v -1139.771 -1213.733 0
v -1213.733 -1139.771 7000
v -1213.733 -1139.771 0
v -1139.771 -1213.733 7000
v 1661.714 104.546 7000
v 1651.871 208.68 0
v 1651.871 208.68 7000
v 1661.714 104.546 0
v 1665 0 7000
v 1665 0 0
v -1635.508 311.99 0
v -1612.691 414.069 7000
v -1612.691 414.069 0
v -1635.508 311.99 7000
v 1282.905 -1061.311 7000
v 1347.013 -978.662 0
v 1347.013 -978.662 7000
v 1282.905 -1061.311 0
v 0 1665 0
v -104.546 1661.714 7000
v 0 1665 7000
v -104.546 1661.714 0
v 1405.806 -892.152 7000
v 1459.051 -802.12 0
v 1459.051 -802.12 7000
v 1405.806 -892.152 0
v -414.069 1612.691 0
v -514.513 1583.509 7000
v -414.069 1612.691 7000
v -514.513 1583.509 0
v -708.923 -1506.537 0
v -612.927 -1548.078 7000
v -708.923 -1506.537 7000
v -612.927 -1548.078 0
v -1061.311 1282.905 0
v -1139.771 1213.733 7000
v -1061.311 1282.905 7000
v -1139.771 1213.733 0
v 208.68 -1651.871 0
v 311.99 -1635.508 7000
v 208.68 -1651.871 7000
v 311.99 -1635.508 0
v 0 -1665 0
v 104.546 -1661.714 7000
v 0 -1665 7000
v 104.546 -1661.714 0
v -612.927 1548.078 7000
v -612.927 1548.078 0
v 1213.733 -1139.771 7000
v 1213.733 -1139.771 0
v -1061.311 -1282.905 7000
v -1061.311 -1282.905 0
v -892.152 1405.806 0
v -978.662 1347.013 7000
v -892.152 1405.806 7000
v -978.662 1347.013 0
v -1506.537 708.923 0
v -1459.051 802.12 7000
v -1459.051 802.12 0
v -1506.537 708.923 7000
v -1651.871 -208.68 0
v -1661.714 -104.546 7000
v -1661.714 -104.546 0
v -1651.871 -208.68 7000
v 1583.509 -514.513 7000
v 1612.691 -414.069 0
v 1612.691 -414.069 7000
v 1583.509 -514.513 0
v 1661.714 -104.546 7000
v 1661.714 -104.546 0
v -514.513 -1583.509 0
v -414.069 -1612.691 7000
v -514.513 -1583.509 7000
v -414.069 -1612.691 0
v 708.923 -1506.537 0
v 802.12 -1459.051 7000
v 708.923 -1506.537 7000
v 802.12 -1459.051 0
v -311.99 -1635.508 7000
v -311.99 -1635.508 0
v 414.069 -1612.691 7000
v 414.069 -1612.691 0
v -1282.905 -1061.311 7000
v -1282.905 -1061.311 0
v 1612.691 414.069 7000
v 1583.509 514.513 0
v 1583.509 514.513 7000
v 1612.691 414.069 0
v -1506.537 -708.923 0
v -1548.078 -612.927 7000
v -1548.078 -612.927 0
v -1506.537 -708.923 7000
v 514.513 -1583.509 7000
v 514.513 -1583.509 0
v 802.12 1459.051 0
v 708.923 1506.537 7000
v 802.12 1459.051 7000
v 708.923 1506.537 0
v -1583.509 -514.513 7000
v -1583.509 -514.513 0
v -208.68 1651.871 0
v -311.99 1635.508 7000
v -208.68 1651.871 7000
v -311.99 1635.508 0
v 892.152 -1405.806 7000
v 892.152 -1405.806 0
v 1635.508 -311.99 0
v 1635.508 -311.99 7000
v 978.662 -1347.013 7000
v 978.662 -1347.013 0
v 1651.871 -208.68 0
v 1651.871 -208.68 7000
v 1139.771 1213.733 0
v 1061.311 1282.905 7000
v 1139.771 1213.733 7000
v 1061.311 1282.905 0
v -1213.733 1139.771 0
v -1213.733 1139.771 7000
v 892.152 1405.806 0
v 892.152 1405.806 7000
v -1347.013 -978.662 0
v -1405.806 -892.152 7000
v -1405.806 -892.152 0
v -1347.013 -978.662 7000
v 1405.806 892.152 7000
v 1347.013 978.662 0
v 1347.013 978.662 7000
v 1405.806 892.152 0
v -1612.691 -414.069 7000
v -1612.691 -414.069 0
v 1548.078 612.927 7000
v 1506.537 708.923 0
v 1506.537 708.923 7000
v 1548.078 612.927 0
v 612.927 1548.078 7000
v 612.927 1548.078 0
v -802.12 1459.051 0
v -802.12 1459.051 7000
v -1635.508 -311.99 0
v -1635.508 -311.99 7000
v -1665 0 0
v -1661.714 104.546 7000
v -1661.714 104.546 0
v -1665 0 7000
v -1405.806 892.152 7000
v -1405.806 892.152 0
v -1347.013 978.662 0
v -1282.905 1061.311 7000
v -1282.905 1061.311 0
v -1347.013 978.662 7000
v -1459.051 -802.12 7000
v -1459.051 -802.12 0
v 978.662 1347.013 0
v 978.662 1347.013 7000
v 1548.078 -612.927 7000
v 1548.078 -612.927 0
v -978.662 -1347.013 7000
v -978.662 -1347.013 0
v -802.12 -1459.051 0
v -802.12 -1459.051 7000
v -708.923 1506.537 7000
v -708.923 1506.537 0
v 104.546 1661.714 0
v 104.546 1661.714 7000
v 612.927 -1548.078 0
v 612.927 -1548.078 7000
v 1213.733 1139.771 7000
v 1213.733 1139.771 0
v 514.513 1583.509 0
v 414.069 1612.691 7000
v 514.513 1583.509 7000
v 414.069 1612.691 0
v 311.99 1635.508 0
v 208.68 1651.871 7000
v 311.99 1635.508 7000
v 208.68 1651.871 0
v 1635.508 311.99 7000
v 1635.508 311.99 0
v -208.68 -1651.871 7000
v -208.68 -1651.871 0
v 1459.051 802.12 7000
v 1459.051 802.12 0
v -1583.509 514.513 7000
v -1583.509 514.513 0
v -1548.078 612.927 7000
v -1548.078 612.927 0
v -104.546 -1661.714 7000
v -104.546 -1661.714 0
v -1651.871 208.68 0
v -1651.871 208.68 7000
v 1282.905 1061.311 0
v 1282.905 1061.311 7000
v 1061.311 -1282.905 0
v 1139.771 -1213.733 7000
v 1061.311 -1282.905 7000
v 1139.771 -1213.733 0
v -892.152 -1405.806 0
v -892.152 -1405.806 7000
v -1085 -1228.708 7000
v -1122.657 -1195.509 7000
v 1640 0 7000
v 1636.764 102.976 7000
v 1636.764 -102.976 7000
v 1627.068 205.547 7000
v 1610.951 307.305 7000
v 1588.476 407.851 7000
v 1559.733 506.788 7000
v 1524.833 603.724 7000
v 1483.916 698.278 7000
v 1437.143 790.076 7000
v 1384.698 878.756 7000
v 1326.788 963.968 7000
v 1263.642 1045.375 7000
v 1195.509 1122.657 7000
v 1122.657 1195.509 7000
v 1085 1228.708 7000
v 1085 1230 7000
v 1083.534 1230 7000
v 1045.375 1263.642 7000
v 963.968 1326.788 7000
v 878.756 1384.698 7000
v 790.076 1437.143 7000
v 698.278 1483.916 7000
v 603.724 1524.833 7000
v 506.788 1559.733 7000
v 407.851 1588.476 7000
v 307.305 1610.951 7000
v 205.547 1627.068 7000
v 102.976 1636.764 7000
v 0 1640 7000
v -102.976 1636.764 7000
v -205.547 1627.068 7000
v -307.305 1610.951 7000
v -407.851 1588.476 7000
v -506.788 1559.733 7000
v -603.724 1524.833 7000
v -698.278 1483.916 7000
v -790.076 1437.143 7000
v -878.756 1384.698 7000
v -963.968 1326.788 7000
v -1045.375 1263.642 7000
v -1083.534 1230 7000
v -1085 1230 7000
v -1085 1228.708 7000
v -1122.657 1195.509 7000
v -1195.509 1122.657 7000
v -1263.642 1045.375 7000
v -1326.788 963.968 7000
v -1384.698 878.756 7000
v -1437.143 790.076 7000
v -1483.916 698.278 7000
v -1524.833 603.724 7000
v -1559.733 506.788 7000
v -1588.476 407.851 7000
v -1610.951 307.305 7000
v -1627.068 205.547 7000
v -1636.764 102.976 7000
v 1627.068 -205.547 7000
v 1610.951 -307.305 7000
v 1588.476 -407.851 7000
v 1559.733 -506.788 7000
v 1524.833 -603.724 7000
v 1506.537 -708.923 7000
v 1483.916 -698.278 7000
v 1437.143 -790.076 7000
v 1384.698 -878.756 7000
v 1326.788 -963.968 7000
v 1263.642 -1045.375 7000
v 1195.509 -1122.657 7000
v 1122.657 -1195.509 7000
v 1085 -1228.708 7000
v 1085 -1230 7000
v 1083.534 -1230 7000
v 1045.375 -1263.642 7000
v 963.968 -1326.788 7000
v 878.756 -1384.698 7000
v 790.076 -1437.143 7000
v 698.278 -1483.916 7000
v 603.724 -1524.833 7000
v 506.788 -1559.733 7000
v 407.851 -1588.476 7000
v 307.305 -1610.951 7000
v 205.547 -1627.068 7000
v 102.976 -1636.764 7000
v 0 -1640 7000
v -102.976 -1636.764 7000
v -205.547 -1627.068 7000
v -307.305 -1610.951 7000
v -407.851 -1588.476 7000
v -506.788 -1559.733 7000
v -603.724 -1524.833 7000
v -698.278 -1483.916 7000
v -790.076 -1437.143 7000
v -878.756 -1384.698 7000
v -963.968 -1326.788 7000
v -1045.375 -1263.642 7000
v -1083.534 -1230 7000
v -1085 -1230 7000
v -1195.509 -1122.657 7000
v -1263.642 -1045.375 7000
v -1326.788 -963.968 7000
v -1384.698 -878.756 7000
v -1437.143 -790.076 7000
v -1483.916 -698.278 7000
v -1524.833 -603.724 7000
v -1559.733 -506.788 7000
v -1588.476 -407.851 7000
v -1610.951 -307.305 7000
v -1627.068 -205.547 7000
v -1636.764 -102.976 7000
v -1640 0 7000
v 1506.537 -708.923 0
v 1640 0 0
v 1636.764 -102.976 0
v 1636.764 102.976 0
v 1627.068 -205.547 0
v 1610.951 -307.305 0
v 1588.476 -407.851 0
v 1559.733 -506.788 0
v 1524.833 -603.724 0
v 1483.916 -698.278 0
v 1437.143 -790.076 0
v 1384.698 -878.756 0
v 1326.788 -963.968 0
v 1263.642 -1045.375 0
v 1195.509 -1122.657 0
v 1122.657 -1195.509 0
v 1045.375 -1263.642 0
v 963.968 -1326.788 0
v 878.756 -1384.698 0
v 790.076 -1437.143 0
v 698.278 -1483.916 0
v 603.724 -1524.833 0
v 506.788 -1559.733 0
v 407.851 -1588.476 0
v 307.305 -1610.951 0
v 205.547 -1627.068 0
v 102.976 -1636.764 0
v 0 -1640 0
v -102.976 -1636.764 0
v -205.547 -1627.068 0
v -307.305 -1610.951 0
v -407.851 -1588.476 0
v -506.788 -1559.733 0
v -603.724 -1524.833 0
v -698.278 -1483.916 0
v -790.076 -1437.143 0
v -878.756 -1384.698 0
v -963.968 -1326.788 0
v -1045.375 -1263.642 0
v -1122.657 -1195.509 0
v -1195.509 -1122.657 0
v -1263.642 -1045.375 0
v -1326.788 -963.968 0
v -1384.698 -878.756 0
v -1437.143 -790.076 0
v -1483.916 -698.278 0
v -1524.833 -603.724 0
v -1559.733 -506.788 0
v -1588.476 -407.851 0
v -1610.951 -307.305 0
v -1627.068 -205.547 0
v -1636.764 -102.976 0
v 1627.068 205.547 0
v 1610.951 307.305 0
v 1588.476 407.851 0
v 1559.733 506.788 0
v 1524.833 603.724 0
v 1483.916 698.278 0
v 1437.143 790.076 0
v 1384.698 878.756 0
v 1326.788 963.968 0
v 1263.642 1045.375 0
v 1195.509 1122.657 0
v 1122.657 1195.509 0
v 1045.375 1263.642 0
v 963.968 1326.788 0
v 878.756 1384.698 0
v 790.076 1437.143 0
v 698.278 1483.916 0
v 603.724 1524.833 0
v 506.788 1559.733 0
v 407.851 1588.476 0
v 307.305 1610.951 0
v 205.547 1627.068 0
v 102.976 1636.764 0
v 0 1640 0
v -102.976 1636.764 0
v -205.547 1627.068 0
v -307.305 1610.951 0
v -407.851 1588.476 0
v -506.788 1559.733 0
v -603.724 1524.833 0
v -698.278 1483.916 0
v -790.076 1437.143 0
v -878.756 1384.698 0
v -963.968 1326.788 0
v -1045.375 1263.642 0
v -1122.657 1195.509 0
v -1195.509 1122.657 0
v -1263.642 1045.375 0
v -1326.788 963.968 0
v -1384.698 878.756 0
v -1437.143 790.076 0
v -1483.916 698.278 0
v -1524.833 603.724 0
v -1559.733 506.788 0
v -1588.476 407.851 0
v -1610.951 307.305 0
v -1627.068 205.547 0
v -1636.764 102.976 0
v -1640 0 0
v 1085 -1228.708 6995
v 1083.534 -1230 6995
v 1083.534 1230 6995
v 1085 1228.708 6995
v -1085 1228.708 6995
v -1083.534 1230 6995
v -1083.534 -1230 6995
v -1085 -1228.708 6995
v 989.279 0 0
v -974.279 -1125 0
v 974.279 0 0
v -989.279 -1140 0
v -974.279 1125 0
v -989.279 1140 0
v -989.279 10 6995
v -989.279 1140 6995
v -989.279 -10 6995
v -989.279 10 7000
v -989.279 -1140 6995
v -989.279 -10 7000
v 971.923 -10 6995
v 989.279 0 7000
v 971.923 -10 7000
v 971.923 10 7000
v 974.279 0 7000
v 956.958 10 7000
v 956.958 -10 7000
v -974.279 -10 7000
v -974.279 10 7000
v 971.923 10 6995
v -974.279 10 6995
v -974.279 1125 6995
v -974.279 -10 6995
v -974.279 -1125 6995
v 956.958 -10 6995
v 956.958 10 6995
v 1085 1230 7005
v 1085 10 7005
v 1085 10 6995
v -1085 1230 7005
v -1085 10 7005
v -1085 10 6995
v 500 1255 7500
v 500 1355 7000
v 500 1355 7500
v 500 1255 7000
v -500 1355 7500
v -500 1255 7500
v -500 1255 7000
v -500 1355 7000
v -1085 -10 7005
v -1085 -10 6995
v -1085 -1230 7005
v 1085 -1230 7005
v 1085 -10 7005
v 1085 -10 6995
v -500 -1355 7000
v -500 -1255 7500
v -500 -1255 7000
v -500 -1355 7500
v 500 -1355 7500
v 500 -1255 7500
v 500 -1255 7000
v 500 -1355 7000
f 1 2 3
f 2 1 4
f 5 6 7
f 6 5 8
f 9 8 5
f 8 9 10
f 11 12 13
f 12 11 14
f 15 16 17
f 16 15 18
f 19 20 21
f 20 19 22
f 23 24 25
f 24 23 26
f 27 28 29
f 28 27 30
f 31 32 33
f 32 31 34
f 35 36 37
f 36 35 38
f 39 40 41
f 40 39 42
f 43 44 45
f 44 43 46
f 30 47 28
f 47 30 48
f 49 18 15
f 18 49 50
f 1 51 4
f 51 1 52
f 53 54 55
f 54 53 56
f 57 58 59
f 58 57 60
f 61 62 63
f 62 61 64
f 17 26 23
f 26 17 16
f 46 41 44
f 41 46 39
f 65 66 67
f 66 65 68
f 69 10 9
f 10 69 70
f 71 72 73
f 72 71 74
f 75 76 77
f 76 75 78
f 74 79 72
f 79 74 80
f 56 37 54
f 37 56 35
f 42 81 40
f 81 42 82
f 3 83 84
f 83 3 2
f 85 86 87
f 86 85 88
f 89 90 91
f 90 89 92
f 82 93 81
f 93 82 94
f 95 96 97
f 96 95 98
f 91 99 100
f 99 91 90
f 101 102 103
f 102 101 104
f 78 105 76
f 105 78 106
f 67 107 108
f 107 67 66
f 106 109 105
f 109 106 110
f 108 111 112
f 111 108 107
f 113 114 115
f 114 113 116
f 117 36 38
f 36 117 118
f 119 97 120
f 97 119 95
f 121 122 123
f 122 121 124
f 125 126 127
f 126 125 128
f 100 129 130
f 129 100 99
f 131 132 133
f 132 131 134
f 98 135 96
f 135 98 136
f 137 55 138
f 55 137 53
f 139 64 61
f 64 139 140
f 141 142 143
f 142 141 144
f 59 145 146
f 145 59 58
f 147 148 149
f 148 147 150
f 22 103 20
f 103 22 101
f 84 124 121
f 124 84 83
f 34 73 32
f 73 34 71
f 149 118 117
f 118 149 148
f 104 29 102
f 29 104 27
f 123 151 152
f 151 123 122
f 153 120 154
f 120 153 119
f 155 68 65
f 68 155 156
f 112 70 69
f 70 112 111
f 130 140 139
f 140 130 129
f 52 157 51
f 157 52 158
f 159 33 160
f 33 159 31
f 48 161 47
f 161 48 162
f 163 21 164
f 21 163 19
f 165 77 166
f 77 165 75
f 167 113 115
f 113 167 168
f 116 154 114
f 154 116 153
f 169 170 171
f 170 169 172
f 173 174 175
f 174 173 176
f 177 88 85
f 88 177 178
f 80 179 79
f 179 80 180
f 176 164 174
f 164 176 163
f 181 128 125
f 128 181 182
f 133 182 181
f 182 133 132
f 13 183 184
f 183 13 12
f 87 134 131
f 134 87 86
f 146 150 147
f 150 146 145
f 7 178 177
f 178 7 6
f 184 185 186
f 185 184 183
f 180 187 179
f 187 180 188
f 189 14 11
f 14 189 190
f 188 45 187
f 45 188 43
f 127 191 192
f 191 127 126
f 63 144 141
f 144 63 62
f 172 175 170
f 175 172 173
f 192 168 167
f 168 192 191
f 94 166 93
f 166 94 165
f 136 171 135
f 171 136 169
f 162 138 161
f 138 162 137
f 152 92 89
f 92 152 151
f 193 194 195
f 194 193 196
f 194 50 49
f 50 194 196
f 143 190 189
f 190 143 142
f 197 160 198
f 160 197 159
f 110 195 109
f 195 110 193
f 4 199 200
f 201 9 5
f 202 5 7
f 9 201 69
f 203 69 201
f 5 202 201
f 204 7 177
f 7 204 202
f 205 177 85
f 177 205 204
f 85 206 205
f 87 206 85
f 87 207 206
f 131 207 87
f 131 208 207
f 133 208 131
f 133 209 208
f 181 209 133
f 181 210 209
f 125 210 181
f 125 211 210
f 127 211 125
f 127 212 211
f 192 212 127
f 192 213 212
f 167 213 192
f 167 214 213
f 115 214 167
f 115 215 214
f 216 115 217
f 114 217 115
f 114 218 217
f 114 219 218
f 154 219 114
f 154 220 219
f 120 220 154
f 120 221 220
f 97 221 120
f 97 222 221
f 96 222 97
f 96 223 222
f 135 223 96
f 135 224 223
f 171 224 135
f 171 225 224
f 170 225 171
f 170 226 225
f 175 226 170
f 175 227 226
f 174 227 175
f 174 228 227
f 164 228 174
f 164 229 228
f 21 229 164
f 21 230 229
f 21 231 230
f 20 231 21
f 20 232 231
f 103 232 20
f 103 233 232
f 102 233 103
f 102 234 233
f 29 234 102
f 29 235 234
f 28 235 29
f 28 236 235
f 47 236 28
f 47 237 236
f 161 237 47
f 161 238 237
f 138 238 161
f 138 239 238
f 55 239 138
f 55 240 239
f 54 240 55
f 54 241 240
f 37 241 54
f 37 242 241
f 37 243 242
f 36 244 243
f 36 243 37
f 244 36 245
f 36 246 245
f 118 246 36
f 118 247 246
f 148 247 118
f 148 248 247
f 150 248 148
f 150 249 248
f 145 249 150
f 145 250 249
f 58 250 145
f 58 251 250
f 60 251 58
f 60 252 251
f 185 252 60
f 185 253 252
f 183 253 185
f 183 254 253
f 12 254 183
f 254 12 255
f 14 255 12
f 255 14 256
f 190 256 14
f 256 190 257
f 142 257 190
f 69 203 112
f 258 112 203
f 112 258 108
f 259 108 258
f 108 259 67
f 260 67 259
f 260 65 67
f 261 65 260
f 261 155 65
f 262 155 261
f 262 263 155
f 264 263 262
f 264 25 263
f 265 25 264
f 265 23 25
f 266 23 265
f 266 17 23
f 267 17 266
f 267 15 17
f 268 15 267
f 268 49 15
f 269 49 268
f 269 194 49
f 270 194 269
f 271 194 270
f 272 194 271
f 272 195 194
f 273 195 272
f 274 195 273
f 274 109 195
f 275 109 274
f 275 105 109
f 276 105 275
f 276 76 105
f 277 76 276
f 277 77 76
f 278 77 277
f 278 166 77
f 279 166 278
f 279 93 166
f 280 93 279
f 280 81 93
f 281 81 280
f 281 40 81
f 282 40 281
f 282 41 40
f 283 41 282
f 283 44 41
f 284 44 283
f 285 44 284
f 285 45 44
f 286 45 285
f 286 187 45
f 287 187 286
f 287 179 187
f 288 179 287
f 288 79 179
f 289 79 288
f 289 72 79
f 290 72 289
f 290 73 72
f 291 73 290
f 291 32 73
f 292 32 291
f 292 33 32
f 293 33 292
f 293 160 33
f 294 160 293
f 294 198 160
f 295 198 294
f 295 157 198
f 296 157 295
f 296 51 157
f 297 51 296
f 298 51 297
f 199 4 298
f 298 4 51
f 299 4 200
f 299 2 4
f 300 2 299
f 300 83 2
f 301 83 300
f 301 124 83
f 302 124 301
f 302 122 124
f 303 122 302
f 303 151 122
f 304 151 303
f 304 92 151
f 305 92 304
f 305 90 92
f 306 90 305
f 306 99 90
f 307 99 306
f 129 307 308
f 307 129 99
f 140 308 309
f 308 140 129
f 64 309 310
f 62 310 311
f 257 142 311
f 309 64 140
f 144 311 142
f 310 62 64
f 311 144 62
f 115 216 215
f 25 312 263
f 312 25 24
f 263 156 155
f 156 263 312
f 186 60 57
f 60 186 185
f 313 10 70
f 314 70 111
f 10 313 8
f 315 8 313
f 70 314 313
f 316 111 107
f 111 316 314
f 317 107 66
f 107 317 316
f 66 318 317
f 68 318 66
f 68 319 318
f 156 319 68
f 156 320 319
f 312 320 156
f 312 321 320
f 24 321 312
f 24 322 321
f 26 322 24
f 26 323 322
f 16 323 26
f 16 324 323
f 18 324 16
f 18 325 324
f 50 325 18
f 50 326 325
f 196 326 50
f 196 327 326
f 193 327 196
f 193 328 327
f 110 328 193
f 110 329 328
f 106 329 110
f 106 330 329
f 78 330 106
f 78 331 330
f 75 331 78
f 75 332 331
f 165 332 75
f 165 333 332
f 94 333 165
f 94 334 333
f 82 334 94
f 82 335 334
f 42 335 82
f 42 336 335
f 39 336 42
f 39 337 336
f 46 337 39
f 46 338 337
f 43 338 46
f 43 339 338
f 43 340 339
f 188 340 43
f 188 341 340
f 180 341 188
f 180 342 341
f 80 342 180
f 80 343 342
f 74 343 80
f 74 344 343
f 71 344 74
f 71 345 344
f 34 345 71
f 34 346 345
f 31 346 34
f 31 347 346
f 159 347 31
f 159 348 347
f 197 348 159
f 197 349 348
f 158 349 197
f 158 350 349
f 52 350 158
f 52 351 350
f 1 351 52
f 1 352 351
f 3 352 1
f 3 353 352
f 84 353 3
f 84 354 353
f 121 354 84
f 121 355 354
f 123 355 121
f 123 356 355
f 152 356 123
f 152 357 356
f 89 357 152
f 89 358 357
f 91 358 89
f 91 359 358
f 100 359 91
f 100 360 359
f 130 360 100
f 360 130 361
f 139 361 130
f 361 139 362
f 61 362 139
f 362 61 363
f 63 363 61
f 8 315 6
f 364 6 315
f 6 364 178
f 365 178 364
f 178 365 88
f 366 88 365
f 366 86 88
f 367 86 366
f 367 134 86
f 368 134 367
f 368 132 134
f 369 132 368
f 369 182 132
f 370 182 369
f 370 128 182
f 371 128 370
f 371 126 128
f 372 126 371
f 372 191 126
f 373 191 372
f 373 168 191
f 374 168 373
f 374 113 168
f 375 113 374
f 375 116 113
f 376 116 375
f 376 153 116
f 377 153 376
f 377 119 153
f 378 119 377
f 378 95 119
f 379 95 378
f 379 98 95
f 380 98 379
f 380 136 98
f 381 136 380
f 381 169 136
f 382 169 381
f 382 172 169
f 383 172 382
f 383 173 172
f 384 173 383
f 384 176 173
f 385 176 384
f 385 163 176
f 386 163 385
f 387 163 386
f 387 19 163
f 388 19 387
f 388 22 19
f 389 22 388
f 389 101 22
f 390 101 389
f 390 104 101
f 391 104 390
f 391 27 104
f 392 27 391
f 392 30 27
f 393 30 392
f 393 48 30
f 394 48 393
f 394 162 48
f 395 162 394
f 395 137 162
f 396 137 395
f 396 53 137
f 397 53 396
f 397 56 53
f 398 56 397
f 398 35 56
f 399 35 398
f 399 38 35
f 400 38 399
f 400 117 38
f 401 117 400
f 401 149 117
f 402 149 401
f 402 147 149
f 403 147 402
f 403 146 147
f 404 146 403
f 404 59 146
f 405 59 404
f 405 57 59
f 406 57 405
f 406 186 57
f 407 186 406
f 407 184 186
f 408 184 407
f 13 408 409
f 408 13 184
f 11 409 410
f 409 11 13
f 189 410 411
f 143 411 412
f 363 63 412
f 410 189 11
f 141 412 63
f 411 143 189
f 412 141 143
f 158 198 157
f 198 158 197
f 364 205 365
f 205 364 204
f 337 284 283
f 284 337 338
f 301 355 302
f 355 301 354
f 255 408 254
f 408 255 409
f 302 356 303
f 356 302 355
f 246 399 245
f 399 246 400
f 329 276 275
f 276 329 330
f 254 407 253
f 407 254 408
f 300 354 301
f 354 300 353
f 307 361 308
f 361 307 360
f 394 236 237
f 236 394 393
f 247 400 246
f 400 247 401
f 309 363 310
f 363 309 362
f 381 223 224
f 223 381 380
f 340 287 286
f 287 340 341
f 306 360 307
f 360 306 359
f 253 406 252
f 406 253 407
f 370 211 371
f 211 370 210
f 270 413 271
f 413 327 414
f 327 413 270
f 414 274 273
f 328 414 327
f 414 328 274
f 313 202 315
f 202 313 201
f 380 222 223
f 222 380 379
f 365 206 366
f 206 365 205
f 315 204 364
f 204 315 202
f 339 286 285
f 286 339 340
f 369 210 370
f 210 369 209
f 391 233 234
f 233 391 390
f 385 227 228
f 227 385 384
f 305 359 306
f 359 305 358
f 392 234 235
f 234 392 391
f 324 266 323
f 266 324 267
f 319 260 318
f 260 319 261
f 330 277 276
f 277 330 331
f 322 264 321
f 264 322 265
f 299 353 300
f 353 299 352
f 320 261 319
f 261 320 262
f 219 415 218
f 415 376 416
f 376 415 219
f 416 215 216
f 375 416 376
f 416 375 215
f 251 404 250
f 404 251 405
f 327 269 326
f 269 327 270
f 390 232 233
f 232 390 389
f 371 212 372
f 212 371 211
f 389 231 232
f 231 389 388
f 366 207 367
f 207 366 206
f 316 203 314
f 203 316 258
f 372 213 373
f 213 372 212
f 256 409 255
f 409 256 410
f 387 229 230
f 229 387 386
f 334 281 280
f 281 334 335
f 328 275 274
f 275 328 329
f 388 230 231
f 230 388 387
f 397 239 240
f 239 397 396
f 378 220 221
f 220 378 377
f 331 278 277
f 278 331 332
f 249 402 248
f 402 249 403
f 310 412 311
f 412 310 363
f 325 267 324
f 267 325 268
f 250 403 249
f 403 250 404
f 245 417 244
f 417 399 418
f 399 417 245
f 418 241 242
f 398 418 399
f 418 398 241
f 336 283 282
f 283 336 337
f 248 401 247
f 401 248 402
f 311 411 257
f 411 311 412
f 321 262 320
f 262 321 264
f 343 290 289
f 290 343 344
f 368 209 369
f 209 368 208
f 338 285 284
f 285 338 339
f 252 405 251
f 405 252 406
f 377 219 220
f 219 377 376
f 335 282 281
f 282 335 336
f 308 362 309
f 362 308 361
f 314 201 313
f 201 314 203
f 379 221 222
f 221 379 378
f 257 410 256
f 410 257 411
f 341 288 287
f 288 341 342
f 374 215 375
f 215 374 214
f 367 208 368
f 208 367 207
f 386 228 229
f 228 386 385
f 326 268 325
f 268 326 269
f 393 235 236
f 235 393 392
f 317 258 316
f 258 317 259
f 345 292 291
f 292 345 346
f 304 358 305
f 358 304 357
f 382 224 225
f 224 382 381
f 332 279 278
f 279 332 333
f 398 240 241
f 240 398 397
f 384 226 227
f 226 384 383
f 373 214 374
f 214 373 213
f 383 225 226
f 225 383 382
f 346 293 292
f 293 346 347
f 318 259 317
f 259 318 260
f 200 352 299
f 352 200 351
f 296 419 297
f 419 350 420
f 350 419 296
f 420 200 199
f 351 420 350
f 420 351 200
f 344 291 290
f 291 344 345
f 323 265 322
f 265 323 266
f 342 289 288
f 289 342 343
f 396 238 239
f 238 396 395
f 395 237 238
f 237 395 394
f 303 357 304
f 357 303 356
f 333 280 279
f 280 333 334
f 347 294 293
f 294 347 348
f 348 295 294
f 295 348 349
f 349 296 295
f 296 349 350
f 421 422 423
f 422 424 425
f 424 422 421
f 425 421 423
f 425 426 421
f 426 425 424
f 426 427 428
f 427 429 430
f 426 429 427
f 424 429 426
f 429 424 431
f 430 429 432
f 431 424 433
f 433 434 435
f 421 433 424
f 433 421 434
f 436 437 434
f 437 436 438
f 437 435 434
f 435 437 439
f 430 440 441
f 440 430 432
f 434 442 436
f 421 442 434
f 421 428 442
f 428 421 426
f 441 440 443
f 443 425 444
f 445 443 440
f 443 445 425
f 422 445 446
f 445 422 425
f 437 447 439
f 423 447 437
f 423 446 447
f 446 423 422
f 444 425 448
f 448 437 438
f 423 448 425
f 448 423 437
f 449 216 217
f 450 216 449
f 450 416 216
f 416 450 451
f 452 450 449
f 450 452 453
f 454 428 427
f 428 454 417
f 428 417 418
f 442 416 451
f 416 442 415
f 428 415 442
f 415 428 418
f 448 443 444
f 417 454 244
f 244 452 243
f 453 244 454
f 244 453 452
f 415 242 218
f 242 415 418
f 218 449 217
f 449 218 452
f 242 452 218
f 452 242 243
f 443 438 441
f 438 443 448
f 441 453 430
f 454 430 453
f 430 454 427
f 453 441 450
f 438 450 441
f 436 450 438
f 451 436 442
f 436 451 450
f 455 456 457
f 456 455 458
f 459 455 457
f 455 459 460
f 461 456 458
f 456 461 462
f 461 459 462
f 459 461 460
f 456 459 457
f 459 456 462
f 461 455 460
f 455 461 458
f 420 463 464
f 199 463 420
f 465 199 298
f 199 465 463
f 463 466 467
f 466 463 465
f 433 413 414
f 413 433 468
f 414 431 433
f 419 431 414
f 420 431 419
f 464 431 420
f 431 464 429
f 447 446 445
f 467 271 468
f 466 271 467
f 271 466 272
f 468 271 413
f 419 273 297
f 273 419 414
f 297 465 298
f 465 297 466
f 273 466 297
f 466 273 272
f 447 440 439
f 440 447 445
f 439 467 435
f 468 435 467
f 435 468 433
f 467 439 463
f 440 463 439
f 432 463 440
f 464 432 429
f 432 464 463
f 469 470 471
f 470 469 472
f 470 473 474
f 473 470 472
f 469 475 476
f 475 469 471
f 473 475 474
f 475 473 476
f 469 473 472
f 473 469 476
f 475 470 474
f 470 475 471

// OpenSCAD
diameter=3330;
height=7000;
mirror_side=2250;
mirror_height=mirror_side/2*sqrt(3);
mon_width=2170;
mon_height=1220;
$fn=100;

module mirrors(h, s) {
    polygon(points=[[h/2,0], [-h/2,s/2], [-h/2,-s/2]], paths=[[0,1,2]]);
}

module monitor() {
    color("blue") cube([mon_width,mon_height,10], center=true);
    color("grey") translate([0,mon_height/2+75,250]) cube([1000,100,500], center=true);
}

module beamer() {
    color("blue") cube([mon_width,mon_height,10], center=true);
    color("grey") translate([0,mon_height/2+75,250]) cube([1000,100,500], center=true);
}

// Aussenhülle
difference() {
    cylinder(d=diameter, h=height);
    cylinder(d=diameter-50, h=height);
}

// Spiegel
difference() {
    linear_extrude(height) mirrors(mirror_height+30, mirror_side+30);
    linear_extrude(height) mirrors(mirror_height, mirror_side);
}

// 2x 98" Monitore
translate([0,mon_height/2+10,height]) monitor();
translate([0,-(mon_height/2+10),height]) rotate([0,0,180]) monitor();
